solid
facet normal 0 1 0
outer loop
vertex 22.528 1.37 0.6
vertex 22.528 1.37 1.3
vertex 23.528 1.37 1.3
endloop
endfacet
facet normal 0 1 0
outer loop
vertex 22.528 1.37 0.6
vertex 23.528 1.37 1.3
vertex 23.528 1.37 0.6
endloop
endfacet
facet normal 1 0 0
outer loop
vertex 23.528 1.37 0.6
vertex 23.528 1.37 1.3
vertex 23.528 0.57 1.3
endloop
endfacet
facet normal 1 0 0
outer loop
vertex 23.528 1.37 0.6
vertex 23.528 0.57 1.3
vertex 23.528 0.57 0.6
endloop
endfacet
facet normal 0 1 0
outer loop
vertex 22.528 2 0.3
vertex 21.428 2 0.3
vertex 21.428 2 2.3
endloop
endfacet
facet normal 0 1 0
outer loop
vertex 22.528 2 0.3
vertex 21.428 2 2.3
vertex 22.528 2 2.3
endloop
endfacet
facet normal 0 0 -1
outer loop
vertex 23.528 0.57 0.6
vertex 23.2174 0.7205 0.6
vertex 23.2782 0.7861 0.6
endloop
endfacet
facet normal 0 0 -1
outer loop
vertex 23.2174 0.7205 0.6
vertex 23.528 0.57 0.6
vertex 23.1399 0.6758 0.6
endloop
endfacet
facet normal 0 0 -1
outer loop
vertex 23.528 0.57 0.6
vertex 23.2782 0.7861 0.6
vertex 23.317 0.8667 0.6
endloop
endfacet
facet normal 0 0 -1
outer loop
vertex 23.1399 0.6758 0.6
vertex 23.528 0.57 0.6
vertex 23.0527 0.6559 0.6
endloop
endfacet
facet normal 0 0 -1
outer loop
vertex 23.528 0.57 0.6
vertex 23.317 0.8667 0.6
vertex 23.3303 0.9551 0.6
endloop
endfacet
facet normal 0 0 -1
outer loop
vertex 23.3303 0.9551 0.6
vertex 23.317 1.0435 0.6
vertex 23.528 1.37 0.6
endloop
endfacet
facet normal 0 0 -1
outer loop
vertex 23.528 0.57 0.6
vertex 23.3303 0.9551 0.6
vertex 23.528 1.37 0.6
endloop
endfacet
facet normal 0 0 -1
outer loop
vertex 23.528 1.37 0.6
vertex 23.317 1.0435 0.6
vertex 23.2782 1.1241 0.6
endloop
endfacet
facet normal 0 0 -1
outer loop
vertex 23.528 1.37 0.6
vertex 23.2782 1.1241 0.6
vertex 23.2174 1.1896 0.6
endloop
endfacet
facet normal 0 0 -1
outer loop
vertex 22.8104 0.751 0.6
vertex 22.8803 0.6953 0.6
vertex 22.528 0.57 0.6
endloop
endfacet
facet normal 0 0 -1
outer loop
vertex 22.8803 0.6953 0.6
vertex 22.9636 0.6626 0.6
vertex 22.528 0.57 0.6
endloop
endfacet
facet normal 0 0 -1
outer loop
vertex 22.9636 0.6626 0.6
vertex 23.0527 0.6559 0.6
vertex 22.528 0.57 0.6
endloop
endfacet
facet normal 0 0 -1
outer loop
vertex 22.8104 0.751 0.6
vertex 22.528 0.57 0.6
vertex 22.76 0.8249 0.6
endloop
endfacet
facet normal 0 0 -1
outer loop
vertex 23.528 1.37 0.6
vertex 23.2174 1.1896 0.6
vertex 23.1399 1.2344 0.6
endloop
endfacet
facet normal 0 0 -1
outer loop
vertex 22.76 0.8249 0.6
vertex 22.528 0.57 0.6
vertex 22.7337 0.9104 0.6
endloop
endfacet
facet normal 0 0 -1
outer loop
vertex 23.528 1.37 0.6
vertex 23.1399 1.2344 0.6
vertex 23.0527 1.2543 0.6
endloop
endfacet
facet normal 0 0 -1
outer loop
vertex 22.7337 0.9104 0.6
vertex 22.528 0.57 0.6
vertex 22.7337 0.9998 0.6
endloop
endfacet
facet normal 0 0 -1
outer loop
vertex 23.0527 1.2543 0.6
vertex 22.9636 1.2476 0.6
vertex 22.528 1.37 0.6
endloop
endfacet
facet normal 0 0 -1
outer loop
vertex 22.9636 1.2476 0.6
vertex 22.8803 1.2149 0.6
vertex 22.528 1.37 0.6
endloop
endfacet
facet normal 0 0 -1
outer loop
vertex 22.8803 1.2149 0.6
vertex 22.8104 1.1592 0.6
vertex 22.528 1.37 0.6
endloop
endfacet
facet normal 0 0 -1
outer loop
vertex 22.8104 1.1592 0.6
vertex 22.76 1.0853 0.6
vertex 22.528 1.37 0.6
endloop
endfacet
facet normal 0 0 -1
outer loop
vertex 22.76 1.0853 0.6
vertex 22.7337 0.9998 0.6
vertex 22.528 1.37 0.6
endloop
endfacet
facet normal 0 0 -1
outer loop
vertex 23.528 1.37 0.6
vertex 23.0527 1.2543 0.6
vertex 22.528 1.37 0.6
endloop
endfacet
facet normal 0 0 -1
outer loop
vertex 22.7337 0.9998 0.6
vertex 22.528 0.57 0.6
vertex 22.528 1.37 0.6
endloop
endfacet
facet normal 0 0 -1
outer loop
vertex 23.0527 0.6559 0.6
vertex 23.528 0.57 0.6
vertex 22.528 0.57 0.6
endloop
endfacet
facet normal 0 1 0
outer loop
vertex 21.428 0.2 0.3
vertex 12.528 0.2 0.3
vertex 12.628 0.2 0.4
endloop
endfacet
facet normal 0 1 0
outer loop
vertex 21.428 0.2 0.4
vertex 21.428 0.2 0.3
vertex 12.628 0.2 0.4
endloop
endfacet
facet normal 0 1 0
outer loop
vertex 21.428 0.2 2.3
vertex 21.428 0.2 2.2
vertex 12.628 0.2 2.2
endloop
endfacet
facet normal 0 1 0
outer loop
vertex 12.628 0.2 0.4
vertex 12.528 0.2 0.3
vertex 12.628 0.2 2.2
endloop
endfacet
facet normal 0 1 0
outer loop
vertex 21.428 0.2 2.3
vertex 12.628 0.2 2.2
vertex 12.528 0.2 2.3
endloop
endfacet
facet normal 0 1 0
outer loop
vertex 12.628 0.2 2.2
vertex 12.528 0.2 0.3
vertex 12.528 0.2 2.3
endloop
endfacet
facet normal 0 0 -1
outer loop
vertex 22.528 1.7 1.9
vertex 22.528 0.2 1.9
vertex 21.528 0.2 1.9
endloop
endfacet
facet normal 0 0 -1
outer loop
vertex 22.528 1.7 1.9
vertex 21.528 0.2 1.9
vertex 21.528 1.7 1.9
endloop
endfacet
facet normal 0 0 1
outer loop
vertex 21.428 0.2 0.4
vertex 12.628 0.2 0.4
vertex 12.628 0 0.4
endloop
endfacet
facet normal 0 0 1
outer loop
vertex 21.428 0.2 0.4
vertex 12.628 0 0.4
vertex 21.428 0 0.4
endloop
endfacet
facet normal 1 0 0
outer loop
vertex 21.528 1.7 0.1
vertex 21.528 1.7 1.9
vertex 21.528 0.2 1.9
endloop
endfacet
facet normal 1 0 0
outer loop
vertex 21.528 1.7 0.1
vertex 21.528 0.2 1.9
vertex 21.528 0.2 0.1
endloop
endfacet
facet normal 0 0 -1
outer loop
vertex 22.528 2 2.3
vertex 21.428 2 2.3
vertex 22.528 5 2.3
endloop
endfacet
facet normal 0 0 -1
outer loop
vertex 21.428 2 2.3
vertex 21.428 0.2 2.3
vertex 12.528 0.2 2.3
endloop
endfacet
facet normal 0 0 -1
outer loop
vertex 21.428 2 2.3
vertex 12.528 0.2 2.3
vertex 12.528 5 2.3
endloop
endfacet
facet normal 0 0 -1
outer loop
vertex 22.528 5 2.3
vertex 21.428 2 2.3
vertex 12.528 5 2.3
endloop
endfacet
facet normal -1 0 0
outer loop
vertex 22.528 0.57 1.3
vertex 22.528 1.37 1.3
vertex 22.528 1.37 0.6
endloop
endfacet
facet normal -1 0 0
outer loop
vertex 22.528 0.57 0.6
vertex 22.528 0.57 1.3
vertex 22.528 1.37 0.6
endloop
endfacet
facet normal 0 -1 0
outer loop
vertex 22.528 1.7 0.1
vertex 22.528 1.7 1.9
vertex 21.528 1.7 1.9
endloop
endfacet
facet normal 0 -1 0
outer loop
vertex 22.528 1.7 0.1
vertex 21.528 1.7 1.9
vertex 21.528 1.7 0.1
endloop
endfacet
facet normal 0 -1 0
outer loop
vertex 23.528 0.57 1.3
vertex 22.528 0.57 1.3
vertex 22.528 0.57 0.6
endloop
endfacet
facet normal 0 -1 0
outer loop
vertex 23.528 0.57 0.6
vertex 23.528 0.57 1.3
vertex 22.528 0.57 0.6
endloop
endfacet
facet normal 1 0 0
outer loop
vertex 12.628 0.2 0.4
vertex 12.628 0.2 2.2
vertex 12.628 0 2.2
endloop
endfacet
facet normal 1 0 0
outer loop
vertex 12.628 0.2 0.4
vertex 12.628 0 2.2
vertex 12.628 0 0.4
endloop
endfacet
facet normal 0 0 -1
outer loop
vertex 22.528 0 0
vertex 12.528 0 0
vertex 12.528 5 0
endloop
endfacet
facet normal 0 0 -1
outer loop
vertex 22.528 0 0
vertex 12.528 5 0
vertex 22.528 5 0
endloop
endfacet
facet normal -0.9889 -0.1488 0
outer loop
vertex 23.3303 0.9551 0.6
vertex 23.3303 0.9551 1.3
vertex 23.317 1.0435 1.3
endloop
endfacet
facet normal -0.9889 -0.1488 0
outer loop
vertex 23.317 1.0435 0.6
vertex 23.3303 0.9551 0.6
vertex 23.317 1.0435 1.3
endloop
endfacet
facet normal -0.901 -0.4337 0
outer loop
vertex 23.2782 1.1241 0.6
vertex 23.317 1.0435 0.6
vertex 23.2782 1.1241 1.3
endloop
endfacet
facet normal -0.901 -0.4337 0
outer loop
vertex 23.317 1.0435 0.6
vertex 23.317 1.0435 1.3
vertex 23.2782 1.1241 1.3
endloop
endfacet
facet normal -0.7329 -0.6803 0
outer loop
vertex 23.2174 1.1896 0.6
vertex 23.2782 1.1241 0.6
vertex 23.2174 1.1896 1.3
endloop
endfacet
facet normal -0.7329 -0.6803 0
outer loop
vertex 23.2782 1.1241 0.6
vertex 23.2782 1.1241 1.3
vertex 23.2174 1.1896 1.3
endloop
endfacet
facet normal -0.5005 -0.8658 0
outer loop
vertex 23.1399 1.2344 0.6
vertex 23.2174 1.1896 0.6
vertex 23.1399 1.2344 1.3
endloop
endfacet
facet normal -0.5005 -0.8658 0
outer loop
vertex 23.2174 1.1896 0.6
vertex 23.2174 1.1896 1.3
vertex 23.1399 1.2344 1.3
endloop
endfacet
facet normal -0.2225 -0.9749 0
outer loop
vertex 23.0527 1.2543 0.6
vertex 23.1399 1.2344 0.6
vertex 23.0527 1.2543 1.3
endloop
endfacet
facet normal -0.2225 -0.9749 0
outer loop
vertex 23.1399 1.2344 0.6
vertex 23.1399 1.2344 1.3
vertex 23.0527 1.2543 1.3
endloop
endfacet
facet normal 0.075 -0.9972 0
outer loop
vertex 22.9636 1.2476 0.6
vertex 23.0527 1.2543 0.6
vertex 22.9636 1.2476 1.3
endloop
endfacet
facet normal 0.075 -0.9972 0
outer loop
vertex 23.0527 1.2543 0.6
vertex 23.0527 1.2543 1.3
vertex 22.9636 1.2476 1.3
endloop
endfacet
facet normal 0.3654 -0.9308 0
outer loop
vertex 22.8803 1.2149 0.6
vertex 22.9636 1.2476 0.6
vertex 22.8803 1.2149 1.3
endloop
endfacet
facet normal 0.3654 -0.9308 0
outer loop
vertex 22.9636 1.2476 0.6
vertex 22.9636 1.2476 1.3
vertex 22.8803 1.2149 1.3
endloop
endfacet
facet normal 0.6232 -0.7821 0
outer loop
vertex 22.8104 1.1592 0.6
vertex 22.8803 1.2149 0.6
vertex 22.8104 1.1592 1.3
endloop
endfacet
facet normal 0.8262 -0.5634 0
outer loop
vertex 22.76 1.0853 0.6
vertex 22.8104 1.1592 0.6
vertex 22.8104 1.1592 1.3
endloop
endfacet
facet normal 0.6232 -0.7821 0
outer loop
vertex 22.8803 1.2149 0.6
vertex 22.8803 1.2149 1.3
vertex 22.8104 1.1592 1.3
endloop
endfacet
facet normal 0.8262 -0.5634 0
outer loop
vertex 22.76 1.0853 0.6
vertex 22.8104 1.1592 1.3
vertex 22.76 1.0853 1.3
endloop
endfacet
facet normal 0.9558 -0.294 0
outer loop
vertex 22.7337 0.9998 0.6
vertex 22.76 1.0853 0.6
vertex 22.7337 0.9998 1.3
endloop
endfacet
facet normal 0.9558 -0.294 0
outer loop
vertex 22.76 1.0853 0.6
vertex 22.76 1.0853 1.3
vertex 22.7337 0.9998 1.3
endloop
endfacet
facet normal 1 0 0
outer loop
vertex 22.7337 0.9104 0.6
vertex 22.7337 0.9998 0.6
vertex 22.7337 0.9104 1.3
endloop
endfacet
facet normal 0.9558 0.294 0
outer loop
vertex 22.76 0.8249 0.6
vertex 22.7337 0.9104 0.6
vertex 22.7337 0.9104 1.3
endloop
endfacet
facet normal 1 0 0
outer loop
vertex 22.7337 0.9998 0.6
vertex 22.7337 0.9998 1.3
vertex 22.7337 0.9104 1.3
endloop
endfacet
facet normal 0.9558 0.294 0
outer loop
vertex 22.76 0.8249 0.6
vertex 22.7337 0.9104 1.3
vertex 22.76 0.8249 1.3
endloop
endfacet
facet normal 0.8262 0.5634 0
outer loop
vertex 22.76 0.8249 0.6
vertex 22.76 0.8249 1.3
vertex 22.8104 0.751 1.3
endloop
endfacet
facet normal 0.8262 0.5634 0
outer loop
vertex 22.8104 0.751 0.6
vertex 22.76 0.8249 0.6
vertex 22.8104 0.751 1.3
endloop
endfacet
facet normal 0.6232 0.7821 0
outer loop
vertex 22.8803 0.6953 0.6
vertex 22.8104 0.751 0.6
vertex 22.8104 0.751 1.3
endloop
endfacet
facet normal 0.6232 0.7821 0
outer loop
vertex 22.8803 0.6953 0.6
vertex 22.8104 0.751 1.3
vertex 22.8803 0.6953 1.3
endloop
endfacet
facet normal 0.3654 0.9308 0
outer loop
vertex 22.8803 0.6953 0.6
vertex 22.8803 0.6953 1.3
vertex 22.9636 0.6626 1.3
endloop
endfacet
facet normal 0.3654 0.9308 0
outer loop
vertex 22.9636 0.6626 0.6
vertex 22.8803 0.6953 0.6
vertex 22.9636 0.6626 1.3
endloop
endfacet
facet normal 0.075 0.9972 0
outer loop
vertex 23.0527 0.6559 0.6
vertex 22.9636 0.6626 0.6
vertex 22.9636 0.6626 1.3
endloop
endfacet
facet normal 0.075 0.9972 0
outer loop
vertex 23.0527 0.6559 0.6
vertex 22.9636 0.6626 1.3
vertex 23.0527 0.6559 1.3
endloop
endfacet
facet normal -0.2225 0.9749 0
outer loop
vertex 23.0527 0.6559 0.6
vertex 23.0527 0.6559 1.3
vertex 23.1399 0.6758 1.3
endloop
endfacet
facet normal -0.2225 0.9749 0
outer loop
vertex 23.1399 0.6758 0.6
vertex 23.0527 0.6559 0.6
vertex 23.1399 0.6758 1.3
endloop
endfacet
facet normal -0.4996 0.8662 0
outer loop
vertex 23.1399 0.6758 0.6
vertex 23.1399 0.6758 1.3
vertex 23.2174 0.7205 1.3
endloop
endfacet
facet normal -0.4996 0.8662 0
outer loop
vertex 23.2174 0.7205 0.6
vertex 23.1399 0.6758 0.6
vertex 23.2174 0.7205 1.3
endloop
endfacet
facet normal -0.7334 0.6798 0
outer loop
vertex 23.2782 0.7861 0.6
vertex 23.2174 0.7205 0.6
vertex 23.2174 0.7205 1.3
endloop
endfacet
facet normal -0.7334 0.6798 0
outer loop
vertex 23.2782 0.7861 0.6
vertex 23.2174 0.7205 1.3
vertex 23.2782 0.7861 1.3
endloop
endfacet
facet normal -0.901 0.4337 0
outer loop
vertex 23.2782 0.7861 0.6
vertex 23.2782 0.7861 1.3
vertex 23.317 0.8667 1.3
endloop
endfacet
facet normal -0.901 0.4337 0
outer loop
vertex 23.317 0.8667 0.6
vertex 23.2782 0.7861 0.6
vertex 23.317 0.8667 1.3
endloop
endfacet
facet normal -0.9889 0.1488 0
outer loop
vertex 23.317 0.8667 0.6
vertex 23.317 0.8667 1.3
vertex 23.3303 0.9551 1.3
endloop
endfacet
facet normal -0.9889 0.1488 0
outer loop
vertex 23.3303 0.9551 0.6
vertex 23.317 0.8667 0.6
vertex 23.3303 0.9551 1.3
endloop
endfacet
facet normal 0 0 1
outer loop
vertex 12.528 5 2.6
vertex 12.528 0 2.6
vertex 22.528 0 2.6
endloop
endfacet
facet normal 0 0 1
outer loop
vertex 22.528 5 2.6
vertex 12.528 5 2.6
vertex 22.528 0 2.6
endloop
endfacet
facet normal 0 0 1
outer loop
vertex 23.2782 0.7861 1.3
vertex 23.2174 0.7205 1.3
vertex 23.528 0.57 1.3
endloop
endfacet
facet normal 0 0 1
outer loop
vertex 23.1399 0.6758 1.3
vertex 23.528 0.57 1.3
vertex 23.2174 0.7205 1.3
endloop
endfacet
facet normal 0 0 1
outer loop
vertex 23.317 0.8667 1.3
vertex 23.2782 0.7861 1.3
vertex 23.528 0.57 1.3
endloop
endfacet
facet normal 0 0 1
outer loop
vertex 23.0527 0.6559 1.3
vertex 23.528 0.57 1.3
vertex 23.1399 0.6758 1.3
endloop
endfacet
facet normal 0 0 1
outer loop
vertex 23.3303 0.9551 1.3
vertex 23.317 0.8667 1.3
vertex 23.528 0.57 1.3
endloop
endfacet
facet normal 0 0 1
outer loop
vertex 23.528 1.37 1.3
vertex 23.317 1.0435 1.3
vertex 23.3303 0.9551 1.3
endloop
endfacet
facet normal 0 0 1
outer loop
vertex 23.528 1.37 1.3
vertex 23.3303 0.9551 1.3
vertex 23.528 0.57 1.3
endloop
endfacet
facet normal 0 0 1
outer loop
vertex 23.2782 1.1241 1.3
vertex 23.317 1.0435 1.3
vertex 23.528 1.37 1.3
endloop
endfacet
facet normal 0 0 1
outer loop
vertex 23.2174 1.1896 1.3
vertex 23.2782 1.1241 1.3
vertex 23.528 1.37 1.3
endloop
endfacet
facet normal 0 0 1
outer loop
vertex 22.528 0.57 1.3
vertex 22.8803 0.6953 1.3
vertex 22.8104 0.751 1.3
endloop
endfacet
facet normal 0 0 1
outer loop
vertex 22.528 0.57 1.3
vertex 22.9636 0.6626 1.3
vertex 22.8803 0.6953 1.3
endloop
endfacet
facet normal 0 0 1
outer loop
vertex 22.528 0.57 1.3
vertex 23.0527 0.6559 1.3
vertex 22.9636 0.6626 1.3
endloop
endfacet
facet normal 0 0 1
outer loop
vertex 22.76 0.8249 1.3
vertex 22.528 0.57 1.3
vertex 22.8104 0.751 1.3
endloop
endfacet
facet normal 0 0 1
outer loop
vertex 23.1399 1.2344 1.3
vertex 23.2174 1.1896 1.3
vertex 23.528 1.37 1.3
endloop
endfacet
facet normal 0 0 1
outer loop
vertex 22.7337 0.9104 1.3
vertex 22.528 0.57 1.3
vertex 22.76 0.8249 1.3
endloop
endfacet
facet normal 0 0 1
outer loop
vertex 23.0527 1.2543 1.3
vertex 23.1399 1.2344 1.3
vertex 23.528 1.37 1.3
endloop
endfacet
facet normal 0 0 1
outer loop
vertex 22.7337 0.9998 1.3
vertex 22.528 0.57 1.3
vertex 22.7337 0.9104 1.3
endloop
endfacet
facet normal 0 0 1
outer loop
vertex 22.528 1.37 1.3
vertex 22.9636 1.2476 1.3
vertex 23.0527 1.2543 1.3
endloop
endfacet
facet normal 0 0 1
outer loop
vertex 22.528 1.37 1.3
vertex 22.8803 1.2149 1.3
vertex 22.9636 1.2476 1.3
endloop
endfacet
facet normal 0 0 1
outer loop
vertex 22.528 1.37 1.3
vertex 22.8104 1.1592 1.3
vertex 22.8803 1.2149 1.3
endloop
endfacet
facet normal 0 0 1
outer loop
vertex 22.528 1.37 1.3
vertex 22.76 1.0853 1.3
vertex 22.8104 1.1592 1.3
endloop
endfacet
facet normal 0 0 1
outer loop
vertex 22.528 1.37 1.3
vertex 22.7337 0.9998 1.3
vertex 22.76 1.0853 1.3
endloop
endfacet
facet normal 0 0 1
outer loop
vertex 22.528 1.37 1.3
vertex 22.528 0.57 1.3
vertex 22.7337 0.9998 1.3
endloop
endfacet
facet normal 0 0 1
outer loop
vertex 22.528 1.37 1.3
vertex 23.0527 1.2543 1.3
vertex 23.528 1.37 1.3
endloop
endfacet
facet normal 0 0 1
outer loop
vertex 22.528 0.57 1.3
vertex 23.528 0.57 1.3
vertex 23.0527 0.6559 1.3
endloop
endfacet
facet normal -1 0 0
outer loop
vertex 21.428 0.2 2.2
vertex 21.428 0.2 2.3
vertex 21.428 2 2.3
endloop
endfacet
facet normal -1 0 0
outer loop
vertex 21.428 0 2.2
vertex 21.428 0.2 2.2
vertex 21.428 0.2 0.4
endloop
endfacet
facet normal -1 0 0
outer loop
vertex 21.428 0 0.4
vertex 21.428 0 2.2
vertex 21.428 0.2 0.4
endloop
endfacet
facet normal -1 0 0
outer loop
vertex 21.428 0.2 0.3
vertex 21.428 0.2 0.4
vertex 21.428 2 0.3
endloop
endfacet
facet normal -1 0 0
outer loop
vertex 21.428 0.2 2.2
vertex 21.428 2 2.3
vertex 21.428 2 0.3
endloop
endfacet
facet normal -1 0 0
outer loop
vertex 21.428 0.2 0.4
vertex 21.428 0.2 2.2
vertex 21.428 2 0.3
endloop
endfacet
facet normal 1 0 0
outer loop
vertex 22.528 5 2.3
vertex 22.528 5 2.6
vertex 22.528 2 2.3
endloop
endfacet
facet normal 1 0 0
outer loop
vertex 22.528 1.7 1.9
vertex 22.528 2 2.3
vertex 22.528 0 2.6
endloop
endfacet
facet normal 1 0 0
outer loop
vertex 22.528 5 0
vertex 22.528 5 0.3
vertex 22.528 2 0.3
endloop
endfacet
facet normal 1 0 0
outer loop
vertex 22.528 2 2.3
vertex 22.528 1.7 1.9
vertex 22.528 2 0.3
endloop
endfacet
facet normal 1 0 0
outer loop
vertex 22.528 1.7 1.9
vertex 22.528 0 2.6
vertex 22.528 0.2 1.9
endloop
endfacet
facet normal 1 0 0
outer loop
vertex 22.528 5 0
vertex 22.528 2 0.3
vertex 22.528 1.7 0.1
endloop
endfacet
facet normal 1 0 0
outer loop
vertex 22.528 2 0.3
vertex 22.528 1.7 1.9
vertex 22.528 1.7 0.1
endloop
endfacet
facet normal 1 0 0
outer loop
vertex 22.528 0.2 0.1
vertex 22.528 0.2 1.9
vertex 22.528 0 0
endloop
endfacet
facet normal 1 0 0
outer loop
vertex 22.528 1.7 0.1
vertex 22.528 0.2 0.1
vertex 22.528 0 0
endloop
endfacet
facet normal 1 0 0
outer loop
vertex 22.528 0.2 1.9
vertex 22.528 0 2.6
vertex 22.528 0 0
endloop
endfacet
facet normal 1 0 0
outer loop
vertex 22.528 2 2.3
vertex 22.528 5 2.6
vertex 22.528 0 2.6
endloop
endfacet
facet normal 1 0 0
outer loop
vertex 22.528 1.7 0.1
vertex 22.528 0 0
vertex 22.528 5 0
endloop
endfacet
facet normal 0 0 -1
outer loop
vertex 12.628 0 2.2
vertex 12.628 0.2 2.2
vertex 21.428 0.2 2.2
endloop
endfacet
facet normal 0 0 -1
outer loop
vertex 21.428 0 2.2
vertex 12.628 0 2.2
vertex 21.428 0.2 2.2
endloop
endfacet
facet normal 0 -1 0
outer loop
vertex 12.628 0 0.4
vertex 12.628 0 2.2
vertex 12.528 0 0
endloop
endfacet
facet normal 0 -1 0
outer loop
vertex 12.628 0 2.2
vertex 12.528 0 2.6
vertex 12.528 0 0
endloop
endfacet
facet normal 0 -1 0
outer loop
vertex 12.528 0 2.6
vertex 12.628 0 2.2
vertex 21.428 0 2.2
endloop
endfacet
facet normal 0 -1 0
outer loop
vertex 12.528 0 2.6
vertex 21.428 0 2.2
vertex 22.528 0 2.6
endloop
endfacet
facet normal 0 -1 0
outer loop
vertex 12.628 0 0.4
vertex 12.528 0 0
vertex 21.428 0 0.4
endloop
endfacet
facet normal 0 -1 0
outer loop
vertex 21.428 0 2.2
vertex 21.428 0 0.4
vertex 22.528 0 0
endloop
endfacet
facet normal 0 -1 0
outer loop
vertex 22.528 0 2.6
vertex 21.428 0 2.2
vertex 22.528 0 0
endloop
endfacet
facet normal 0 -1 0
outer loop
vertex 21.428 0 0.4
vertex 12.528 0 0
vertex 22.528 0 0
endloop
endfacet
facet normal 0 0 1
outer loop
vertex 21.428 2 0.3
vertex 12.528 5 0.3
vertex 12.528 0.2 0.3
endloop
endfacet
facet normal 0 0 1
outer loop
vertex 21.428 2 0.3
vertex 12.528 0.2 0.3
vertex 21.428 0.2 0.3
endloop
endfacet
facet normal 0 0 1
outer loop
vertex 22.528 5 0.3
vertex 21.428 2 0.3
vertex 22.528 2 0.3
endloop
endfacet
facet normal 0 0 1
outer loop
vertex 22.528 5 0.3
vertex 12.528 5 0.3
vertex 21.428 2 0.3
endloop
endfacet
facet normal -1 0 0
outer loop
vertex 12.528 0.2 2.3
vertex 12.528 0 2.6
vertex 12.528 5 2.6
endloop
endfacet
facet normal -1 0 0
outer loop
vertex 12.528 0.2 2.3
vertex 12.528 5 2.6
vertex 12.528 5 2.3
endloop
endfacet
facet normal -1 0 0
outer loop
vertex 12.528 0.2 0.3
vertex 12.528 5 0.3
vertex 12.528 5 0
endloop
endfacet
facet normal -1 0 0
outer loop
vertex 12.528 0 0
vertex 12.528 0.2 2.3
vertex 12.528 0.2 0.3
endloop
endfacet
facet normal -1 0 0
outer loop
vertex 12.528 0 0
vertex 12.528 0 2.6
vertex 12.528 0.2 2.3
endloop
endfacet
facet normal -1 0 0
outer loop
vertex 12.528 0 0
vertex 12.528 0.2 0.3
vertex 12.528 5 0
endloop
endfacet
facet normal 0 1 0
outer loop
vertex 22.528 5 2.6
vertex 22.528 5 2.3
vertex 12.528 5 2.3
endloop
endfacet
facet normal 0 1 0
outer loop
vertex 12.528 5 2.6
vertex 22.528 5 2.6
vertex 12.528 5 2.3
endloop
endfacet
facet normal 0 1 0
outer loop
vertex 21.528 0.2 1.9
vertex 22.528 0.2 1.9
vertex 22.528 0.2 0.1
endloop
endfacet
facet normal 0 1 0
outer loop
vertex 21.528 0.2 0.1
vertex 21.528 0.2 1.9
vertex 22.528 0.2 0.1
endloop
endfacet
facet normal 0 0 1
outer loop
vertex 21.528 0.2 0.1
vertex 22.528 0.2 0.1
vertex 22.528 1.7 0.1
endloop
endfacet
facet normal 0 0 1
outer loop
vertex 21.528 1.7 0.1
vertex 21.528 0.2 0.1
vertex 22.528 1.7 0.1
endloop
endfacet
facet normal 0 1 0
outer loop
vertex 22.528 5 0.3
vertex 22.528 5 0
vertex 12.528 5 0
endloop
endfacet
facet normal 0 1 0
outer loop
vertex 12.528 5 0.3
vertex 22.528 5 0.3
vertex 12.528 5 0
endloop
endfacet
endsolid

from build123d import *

# Parameters (mm, degrees)
SKETCH19_W           = 10
SKETCH19_H           = 2.6
BOSS_EXTRUDE14_DEPTH = 7
SKETCH20_W           = 10
SKETCH20_H           = 2
CUT_EXTRUDE8_DEPTH   = 5
SKETCH21_W           = 0.7
SKETCH21_H           = 0.8
BOSS_EXTRUDE15_DEPTH = 1
SKETCH22_R           = 0.3
CUT_EXTRUDE9_DEPTH   = 1
SKETCH23_W           = 1.8
SKETCH23_H           = 1.5
CUT_EXTRUDE10_DEPTH  = 1
SKETCH24_W           = 8.8
SKETCH24_H           = 1.8
CUT_EXTRUDE11_DEPTH  = 10
SKETCH25_W           = 2
SKETCH25_H           = 1.8
CUT_EXTRUDE13_DEPTH  = 8.9
SKETCH26_W           = 10
SKETCH26_H           = 2
CUT_EXTRUDE14_DEPTH  = 10


with BuildPart() as part:
    # Sketch19 → Boss-Extrude14 (new body)
    with BuildSketch(Plane(origin=(0, 0, 0), x_dir=(1, 0, 0), z_dir=(0, 1, 0))):
        with Locations((17.528038796, -1.3)):
            Rectangle(SKETCH19_W, SKETCH19_H)
    extrude(amount=BOSS_EXTRUDE14_DEPTH)

    # Sketch20 → Cut-Extrude8 (cut)
    with BuildSketch(Plane(origin=(0, 7, 0), x_dir=(1, 0, 0), z_dir=(0, 1, 0))):
        with Locations((17.528038796, -1.3)):
            Rectangle(SKETCH20_W, SKETCH20_H)
    extrude(amount=-CUT_EXTRUDE8_DEPTH, mode=Mode.SUBTRACT)

    # Sketch21 → Boss-Extrude15 (add)
    with BuildSketch(Plane(origin=(22.528038796, 0, 0), x_dir=(0, 0, -1), z_dir=(1, 0, 0))):
        with Locations((-0.95, 0.97)):
            Rectangle(SKETCH21_W, SKETCH21_H)
    extrude(amount=BOSS_EXTRUDE15_DEPTH)

    # Sketch22 → Cut-Extrude9 (cut)
    with BuildSketch(Plane.XY.offset(1.3)):
        with Locations((23.030317853, 0.955099212)):
            Circle(SKETCH22_R)
    extrude(amount=-CUT_EXTRUDE9_DEPTH, mode=Mode.SUBTRACT)

    # Sketch23 → Cut-Extrude10 (cut)
    with BuildSketch(Plane(origin=(22.528038796, 0, 0), x_dir=(0, 0, -1), z_dir=(1, 0, 0))):
        with Locations((-1, 0.95)):
            Rectangle(SKETCH23_W, SKETCH23_H)
    extrude(amount=-CUT_EXTRUDE10_DEPTH, mode=Mode.SUBTRACT)

    # Sketch24 → Cut-Extrude11 (cut)
    with BuildSketch(Plane(origin=(0, 2, 0), x_dir=(1, 0, 0), z_dir=(0, 1, 0))):
        with Locations((17.028038796, -1.3)):
            Rectangle(SKETCH24_W, SKETCH24_H)
    extrude(amount=-CUT_EXTRUDE11_DEPTH, mode=Mode.SUBTRACT)

    # Sketch25 → Cut-Extrude13 (cut)
    with BuildSketch(Plane.ZY.offset(-12.528038796)):
        with Locations((1.3, 1.1)):
            Rectangle(SKETCH25_W, SKETCH25_H)
    extrude(amount=-CUT_EXTRUDE13_DEPTH, mode=Mode.SUBTRACT)

    # Sketch26 → Cut-Extrude14 (cut)
    with BuildSketch(Plane(origin=(0, 0, 0), x_dir=(-1, 0, 0), z_dir=(0, 0, -1))):
        with Locations((-17.528038796, 6)):
            Rectangle(SKETCH26_W, SKETCH26_H)
    extrude(amount=-CUT_EXTRUDE14_DEPTH, mode=Mode.SUBTRACT)


solid = part.part
